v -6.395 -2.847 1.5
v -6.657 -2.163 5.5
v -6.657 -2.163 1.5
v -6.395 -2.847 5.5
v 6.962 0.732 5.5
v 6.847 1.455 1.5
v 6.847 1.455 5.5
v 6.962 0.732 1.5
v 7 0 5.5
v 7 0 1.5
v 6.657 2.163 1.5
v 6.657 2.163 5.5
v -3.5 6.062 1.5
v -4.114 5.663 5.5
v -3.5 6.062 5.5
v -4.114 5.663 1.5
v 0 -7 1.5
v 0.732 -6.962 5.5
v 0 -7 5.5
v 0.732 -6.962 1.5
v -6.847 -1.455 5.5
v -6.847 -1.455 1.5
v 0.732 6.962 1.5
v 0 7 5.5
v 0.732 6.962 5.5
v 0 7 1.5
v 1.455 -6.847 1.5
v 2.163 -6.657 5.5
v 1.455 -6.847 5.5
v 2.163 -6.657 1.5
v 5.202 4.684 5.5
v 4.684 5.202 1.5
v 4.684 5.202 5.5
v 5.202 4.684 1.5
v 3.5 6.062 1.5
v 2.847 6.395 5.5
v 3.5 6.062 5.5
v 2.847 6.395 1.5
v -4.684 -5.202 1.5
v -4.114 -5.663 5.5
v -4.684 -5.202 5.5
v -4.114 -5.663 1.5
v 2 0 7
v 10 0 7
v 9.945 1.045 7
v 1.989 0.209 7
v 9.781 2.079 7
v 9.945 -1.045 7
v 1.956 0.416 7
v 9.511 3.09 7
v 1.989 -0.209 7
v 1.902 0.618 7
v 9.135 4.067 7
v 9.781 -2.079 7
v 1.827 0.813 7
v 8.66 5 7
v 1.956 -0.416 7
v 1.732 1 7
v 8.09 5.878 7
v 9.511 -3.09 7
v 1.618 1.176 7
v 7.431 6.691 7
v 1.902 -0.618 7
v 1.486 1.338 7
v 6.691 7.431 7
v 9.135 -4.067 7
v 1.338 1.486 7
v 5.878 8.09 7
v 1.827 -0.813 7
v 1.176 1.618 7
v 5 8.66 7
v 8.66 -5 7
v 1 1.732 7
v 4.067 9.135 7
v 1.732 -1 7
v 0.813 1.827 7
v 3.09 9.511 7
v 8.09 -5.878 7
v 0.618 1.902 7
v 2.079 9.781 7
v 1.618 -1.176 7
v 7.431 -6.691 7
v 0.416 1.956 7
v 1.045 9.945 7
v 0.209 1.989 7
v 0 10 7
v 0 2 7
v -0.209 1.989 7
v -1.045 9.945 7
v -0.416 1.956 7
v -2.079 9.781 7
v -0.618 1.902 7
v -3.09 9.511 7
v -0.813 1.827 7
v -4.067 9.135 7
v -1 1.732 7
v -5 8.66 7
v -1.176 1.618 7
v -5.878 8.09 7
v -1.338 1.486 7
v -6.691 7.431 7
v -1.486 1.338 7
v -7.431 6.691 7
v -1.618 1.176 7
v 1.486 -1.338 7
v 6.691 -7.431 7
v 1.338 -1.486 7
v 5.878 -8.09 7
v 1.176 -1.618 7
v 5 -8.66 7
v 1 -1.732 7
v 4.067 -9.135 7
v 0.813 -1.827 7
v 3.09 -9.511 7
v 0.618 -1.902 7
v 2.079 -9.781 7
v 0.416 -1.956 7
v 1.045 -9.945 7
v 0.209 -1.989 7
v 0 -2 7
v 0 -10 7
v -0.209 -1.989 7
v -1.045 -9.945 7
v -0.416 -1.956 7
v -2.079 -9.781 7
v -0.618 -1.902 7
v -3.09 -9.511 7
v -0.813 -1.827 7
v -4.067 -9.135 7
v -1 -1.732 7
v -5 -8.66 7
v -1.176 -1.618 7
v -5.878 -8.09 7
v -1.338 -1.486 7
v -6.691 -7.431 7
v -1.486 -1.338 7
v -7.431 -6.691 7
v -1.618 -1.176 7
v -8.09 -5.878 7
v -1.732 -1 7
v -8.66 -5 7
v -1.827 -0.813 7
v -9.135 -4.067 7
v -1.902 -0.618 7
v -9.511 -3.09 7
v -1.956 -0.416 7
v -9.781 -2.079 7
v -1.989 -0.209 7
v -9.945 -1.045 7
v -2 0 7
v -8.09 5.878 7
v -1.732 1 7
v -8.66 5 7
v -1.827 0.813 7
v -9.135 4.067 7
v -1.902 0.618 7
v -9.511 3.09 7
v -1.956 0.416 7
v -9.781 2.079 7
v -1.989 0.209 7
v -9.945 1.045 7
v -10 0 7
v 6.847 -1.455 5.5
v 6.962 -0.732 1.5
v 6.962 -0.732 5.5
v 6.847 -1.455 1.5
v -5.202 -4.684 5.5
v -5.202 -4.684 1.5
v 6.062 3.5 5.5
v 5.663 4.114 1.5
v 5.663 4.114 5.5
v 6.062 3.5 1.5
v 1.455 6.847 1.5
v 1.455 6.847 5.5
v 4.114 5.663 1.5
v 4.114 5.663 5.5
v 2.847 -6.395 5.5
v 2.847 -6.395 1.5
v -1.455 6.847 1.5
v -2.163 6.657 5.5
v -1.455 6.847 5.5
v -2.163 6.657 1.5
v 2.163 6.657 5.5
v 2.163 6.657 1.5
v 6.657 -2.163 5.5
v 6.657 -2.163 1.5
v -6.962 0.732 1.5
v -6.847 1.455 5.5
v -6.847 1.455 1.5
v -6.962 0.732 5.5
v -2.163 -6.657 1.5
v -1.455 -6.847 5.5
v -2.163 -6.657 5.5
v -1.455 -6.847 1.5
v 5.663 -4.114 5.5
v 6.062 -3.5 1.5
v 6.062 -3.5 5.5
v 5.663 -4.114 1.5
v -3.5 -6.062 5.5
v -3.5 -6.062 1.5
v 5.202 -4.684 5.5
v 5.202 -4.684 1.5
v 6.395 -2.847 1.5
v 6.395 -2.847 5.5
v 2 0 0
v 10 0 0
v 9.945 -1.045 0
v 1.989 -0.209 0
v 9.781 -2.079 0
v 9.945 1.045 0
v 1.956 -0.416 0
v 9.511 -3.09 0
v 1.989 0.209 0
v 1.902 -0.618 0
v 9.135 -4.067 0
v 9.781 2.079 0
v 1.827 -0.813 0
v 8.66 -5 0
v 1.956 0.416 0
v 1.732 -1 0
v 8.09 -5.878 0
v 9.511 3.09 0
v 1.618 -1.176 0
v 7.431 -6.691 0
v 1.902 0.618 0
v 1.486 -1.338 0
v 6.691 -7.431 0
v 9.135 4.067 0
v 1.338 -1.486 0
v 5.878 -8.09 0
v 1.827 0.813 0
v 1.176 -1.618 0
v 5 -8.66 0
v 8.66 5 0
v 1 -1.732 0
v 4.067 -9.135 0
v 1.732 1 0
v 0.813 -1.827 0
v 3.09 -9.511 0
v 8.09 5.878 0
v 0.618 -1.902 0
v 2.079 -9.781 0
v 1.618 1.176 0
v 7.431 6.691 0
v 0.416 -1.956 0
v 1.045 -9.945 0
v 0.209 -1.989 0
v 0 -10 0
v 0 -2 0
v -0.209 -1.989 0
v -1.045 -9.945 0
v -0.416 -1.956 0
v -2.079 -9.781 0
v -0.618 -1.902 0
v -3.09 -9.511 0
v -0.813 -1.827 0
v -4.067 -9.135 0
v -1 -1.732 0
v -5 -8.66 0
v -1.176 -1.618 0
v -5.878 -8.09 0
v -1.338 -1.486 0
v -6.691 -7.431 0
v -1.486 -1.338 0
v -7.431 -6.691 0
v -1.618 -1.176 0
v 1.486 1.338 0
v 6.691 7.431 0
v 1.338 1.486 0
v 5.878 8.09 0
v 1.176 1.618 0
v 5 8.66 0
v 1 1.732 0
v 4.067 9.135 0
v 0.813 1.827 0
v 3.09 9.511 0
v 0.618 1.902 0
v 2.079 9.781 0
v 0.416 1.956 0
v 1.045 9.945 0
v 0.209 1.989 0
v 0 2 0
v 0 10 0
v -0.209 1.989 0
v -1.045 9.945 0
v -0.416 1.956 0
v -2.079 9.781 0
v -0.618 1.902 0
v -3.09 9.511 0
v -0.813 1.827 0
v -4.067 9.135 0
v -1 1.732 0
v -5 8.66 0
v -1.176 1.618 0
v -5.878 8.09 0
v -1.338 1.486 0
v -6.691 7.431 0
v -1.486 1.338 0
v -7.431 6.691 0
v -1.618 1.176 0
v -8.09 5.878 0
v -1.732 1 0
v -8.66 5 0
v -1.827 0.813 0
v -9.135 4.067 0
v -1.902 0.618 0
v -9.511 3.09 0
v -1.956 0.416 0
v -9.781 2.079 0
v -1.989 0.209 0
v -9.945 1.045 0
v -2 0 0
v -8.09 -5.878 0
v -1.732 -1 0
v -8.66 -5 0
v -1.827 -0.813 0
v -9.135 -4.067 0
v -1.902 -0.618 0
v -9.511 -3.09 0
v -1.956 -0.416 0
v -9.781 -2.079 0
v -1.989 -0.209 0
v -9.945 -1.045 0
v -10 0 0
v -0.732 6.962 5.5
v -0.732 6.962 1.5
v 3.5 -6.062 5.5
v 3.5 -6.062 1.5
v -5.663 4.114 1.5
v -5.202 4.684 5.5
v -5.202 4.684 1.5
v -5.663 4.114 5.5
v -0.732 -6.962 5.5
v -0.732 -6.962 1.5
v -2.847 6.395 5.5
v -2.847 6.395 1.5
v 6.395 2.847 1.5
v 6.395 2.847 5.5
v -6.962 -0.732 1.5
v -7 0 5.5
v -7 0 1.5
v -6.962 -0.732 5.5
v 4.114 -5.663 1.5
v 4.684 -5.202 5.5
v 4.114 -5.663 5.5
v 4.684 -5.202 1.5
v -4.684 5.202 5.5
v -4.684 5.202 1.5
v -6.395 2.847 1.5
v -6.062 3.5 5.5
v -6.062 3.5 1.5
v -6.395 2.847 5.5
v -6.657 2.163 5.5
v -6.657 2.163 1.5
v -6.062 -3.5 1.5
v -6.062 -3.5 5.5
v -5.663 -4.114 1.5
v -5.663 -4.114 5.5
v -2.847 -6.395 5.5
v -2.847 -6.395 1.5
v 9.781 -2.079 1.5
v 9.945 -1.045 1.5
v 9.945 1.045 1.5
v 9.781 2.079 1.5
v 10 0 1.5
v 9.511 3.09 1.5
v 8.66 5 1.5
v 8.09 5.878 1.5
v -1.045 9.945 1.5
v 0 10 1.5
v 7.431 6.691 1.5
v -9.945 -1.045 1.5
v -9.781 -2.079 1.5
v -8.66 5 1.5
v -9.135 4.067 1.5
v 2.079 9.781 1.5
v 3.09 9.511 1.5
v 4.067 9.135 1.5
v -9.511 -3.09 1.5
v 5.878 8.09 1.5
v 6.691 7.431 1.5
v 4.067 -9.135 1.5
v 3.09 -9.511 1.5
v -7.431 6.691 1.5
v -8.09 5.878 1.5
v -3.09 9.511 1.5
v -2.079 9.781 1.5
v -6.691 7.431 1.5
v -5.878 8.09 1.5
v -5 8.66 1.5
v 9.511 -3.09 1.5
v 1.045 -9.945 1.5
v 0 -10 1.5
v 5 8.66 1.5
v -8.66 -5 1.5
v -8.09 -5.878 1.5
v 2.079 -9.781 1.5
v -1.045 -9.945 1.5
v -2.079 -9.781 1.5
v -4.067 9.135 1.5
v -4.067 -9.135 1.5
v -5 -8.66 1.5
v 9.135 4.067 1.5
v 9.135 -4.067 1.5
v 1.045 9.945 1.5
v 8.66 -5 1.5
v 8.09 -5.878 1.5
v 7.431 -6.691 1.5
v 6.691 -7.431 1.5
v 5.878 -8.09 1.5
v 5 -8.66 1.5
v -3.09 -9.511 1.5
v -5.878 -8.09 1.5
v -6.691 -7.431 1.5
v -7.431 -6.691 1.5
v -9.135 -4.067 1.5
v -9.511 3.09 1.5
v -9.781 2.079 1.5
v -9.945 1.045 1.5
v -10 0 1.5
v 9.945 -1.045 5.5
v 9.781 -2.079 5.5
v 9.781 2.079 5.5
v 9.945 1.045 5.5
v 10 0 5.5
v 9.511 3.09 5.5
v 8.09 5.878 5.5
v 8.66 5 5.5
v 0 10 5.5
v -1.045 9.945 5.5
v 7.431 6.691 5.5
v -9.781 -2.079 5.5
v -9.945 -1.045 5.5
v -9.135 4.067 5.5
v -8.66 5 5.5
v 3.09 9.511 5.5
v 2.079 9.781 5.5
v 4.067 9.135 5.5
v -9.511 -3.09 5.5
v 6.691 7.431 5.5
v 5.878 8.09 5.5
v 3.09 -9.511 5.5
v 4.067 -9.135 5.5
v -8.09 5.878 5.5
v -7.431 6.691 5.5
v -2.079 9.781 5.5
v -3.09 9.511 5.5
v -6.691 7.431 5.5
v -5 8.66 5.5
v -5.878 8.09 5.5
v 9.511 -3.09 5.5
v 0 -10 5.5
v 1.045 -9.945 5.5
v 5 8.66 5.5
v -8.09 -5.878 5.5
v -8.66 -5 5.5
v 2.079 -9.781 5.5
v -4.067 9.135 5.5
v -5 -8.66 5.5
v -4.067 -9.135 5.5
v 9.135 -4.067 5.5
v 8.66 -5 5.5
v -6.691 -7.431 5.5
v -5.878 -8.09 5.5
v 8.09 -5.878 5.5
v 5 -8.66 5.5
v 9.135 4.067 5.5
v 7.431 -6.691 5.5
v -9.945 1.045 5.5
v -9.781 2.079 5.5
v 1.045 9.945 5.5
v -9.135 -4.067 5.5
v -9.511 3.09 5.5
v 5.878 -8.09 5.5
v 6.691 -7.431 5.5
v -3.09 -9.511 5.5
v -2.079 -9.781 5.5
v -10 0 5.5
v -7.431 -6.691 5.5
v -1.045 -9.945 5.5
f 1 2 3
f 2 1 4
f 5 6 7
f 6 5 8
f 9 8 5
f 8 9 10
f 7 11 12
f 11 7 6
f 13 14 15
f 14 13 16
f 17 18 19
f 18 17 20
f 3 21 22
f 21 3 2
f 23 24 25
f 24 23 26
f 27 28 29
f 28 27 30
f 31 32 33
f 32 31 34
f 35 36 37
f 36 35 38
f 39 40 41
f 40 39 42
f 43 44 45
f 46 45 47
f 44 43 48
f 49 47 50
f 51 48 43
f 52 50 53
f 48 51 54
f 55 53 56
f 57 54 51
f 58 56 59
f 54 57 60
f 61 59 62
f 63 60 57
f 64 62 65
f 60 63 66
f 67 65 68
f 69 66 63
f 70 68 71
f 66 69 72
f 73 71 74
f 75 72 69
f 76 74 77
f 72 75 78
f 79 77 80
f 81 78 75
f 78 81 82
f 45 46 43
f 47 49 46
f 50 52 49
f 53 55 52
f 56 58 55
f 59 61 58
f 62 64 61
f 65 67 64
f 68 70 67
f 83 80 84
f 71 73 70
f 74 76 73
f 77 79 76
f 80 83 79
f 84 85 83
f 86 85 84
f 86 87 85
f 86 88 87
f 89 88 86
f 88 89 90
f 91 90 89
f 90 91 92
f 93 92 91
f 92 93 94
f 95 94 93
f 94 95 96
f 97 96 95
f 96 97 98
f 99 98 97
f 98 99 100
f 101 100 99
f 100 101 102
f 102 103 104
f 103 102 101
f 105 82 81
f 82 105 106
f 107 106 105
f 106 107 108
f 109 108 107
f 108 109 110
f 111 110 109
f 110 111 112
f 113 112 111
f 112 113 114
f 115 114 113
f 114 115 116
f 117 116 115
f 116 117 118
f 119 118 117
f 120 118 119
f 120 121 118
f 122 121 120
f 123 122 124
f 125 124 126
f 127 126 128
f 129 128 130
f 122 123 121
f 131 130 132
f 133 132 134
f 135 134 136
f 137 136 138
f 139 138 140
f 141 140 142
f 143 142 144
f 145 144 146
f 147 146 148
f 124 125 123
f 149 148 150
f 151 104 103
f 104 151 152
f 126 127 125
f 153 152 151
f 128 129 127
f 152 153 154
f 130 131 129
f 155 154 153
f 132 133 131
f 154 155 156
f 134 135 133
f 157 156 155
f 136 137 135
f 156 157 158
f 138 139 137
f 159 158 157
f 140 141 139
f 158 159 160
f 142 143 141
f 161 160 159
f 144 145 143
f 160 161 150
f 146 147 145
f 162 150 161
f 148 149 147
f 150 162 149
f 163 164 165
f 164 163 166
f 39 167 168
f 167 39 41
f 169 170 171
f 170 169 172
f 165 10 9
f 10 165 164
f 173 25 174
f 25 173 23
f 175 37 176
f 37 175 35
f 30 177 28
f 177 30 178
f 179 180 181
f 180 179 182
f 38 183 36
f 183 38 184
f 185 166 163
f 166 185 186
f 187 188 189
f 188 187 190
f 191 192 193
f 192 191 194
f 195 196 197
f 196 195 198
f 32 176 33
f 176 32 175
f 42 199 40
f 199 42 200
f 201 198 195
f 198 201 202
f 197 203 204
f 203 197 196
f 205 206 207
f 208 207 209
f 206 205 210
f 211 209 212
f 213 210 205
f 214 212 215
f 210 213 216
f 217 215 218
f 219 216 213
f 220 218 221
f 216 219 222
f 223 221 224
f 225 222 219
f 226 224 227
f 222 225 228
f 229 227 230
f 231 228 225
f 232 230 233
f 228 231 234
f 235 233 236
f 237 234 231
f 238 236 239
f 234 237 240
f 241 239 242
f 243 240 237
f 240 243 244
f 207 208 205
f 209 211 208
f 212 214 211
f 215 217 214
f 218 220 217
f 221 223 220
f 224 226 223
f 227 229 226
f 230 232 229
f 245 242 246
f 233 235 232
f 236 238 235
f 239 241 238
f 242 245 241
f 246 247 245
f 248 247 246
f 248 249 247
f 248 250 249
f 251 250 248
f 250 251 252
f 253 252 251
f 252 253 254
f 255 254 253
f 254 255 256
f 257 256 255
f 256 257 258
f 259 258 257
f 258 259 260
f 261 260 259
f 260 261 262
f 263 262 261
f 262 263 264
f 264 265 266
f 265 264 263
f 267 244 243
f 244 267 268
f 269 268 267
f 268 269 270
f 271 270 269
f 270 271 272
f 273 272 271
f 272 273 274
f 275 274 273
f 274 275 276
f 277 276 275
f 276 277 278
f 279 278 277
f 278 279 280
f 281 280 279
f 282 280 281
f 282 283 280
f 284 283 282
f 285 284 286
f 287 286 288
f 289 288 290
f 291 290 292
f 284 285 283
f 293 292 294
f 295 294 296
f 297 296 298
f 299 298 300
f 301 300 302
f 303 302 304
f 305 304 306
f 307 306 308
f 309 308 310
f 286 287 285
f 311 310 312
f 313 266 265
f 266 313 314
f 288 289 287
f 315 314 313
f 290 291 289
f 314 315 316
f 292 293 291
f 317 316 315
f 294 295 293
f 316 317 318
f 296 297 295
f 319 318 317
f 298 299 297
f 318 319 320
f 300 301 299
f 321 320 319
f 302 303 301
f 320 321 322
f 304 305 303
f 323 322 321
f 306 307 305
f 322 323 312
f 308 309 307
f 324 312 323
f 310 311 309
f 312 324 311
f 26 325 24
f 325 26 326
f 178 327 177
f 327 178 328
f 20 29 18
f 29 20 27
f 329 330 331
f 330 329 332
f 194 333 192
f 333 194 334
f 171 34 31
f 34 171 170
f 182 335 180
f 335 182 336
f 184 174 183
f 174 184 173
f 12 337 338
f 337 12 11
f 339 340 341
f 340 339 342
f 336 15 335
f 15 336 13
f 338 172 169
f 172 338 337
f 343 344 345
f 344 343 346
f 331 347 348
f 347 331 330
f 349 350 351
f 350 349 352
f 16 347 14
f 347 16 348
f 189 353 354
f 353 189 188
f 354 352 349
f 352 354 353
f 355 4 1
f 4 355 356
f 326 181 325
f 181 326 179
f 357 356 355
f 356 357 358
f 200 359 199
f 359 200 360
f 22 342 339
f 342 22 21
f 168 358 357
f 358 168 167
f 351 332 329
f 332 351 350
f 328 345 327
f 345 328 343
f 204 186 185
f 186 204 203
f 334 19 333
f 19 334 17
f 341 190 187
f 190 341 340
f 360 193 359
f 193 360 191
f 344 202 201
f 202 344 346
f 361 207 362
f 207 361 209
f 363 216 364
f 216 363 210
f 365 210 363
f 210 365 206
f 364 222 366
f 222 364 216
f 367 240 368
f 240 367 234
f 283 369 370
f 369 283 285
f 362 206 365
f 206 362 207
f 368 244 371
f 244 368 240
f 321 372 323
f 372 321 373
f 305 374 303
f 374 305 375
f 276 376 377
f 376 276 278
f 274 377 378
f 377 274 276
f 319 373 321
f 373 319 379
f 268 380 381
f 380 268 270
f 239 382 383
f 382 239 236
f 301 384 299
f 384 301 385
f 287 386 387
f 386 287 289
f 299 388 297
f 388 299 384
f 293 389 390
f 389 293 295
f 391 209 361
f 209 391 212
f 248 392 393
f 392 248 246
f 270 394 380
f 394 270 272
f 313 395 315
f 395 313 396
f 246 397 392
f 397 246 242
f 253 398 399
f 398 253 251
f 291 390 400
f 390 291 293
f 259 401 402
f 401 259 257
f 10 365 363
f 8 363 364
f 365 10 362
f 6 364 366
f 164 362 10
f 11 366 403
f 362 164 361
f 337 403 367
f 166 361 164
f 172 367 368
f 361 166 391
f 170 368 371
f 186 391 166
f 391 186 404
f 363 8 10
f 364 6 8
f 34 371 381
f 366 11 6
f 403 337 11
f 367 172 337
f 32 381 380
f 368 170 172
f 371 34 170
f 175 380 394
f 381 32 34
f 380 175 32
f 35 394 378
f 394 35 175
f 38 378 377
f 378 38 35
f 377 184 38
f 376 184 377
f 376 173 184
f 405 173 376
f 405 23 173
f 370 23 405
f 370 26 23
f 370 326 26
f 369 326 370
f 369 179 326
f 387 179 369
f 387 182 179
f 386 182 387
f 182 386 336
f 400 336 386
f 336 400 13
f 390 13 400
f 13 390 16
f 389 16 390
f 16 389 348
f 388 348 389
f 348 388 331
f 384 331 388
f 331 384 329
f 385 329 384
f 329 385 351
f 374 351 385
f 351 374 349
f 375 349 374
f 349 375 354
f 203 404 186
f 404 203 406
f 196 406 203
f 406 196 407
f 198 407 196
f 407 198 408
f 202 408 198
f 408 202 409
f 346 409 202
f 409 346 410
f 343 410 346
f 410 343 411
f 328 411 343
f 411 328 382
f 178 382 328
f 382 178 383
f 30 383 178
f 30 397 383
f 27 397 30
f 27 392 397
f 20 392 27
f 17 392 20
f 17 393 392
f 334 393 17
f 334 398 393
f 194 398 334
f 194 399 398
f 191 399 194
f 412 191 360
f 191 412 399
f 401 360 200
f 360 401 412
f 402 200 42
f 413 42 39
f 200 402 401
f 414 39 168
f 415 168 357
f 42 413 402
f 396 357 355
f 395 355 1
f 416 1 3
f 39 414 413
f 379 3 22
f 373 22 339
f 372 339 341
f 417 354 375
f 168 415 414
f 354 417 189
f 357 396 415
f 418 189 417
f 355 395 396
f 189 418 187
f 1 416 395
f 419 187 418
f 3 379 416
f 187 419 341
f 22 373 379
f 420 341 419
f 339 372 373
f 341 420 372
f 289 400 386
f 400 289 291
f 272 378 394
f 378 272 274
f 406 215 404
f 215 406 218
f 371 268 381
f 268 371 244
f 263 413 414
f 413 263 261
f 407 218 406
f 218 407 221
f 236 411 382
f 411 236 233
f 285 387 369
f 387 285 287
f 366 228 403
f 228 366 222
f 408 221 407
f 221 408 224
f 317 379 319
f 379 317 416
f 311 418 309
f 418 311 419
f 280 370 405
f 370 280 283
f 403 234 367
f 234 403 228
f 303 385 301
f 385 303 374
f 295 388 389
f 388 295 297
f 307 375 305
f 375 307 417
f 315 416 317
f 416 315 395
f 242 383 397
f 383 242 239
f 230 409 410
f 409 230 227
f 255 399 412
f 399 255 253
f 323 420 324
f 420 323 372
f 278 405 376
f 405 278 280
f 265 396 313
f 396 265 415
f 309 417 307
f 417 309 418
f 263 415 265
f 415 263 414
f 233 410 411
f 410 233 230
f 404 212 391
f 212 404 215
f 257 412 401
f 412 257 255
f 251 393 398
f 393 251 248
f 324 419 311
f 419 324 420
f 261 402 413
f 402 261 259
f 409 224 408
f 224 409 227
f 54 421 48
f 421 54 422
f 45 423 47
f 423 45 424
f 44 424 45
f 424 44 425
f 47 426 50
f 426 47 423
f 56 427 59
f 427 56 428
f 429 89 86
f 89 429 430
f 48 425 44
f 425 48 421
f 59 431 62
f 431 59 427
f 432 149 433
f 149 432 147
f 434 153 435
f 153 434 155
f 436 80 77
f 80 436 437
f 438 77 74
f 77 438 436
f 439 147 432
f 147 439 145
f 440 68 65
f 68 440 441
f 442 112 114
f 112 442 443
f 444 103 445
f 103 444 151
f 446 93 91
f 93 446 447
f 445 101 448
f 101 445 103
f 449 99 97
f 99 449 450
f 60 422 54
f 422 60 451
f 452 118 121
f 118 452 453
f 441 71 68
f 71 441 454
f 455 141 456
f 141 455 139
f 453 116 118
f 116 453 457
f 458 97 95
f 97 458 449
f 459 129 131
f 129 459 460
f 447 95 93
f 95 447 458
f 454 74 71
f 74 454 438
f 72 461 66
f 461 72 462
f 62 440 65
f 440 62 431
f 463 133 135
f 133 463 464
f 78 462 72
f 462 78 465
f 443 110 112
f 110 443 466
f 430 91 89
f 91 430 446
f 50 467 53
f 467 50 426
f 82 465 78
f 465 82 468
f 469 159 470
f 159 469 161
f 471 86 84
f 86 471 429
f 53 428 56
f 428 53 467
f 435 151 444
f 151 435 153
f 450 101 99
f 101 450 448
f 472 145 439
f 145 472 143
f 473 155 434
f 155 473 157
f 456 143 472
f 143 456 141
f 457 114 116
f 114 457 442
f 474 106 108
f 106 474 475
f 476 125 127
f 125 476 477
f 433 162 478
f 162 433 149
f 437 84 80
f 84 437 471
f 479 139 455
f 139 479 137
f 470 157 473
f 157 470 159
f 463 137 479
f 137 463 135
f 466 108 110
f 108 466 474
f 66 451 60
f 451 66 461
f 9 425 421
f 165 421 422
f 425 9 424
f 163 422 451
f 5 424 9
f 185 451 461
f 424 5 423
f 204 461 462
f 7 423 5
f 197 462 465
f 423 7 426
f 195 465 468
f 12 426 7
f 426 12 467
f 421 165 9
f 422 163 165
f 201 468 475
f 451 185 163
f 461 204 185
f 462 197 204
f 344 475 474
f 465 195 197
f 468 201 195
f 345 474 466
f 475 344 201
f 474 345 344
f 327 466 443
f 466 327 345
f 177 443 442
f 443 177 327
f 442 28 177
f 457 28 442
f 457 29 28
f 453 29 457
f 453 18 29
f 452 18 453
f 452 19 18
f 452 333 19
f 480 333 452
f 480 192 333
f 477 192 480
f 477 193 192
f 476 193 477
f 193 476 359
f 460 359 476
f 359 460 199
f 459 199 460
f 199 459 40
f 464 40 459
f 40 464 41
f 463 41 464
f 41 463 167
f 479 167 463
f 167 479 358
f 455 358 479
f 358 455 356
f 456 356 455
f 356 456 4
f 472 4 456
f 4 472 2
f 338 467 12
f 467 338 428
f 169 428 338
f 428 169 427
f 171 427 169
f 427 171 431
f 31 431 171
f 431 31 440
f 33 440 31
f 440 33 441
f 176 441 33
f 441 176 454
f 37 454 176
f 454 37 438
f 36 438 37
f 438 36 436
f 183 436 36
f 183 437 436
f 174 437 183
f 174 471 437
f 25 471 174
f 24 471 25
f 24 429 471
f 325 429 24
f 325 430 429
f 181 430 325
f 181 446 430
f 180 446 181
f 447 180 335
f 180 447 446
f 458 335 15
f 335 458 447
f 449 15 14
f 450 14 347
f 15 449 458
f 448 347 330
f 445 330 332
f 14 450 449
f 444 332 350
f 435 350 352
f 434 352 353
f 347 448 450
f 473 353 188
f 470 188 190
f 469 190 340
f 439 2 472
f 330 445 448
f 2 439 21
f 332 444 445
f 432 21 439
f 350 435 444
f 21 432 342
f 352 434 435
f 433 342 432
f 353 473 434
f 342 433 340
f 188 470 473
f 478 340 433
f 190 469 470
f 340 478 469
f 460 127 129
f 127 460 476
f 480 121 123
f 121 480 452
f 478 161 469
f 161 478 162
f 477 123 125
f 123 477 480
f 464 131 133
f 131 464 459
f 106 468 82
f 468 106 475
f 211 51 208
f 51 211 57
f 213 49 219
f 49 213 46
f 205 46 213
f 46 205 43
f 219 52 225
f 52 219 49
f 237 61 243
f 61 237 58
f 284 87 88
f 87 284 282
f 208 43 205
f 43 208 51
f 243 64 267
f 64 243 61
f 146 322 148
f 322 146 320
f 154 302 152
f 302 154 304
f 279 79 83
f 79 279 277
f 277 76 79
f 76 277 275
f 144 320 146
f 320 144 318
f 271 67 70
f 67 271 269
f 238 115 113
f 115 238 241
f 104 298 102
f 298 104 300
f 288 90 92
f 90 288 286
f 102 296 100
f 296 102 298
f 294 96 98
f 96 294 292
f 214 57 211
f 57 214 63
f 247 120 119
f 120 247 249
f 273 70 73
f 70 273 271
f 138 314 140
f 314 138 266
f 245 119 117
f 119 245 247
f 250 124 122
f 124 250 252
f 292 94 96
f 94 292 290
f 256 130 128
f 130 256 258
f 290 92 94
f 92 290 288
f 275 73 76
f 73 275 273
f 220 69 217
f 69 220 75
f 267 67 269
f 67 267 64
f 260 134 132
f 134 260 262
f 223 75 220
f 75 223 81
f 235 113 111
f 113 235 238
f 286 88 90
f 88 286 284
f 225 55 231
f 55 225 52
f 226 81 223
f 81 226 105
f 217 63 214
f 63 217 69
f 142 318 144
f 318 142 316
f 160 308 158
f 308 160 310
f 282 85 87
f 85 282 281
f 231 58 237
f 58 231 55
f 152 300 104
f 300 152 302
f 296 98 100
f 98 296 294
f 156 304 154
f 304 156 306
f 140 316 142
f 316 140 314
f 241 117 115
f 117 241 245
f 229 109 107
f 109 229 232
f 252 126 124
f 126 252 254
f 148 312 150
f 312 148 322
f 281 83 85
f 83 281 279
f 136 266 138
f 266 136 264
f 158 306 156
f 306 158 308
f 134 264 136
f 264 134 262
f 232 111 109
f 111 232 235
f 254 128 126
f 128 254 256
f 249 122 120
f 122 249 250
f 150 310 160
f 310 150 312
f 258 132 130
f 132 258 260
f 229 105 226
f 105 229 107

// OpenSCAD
// Belt-guide pulley flange.
$fn = 60;
eps = 0.02;
bore_d = 4;
body_d = 14;
width = 7;
difference() { union() { cylinder(d=body_d,h=width); cylinder(d=body_d+6,h=1.5); translate([0,0,width-1.5]) cylinder(d=body_d+6,h=1.5); } translate([0,0,-eps]) cylinder(d=bore_d,h=width+2*eps); }
